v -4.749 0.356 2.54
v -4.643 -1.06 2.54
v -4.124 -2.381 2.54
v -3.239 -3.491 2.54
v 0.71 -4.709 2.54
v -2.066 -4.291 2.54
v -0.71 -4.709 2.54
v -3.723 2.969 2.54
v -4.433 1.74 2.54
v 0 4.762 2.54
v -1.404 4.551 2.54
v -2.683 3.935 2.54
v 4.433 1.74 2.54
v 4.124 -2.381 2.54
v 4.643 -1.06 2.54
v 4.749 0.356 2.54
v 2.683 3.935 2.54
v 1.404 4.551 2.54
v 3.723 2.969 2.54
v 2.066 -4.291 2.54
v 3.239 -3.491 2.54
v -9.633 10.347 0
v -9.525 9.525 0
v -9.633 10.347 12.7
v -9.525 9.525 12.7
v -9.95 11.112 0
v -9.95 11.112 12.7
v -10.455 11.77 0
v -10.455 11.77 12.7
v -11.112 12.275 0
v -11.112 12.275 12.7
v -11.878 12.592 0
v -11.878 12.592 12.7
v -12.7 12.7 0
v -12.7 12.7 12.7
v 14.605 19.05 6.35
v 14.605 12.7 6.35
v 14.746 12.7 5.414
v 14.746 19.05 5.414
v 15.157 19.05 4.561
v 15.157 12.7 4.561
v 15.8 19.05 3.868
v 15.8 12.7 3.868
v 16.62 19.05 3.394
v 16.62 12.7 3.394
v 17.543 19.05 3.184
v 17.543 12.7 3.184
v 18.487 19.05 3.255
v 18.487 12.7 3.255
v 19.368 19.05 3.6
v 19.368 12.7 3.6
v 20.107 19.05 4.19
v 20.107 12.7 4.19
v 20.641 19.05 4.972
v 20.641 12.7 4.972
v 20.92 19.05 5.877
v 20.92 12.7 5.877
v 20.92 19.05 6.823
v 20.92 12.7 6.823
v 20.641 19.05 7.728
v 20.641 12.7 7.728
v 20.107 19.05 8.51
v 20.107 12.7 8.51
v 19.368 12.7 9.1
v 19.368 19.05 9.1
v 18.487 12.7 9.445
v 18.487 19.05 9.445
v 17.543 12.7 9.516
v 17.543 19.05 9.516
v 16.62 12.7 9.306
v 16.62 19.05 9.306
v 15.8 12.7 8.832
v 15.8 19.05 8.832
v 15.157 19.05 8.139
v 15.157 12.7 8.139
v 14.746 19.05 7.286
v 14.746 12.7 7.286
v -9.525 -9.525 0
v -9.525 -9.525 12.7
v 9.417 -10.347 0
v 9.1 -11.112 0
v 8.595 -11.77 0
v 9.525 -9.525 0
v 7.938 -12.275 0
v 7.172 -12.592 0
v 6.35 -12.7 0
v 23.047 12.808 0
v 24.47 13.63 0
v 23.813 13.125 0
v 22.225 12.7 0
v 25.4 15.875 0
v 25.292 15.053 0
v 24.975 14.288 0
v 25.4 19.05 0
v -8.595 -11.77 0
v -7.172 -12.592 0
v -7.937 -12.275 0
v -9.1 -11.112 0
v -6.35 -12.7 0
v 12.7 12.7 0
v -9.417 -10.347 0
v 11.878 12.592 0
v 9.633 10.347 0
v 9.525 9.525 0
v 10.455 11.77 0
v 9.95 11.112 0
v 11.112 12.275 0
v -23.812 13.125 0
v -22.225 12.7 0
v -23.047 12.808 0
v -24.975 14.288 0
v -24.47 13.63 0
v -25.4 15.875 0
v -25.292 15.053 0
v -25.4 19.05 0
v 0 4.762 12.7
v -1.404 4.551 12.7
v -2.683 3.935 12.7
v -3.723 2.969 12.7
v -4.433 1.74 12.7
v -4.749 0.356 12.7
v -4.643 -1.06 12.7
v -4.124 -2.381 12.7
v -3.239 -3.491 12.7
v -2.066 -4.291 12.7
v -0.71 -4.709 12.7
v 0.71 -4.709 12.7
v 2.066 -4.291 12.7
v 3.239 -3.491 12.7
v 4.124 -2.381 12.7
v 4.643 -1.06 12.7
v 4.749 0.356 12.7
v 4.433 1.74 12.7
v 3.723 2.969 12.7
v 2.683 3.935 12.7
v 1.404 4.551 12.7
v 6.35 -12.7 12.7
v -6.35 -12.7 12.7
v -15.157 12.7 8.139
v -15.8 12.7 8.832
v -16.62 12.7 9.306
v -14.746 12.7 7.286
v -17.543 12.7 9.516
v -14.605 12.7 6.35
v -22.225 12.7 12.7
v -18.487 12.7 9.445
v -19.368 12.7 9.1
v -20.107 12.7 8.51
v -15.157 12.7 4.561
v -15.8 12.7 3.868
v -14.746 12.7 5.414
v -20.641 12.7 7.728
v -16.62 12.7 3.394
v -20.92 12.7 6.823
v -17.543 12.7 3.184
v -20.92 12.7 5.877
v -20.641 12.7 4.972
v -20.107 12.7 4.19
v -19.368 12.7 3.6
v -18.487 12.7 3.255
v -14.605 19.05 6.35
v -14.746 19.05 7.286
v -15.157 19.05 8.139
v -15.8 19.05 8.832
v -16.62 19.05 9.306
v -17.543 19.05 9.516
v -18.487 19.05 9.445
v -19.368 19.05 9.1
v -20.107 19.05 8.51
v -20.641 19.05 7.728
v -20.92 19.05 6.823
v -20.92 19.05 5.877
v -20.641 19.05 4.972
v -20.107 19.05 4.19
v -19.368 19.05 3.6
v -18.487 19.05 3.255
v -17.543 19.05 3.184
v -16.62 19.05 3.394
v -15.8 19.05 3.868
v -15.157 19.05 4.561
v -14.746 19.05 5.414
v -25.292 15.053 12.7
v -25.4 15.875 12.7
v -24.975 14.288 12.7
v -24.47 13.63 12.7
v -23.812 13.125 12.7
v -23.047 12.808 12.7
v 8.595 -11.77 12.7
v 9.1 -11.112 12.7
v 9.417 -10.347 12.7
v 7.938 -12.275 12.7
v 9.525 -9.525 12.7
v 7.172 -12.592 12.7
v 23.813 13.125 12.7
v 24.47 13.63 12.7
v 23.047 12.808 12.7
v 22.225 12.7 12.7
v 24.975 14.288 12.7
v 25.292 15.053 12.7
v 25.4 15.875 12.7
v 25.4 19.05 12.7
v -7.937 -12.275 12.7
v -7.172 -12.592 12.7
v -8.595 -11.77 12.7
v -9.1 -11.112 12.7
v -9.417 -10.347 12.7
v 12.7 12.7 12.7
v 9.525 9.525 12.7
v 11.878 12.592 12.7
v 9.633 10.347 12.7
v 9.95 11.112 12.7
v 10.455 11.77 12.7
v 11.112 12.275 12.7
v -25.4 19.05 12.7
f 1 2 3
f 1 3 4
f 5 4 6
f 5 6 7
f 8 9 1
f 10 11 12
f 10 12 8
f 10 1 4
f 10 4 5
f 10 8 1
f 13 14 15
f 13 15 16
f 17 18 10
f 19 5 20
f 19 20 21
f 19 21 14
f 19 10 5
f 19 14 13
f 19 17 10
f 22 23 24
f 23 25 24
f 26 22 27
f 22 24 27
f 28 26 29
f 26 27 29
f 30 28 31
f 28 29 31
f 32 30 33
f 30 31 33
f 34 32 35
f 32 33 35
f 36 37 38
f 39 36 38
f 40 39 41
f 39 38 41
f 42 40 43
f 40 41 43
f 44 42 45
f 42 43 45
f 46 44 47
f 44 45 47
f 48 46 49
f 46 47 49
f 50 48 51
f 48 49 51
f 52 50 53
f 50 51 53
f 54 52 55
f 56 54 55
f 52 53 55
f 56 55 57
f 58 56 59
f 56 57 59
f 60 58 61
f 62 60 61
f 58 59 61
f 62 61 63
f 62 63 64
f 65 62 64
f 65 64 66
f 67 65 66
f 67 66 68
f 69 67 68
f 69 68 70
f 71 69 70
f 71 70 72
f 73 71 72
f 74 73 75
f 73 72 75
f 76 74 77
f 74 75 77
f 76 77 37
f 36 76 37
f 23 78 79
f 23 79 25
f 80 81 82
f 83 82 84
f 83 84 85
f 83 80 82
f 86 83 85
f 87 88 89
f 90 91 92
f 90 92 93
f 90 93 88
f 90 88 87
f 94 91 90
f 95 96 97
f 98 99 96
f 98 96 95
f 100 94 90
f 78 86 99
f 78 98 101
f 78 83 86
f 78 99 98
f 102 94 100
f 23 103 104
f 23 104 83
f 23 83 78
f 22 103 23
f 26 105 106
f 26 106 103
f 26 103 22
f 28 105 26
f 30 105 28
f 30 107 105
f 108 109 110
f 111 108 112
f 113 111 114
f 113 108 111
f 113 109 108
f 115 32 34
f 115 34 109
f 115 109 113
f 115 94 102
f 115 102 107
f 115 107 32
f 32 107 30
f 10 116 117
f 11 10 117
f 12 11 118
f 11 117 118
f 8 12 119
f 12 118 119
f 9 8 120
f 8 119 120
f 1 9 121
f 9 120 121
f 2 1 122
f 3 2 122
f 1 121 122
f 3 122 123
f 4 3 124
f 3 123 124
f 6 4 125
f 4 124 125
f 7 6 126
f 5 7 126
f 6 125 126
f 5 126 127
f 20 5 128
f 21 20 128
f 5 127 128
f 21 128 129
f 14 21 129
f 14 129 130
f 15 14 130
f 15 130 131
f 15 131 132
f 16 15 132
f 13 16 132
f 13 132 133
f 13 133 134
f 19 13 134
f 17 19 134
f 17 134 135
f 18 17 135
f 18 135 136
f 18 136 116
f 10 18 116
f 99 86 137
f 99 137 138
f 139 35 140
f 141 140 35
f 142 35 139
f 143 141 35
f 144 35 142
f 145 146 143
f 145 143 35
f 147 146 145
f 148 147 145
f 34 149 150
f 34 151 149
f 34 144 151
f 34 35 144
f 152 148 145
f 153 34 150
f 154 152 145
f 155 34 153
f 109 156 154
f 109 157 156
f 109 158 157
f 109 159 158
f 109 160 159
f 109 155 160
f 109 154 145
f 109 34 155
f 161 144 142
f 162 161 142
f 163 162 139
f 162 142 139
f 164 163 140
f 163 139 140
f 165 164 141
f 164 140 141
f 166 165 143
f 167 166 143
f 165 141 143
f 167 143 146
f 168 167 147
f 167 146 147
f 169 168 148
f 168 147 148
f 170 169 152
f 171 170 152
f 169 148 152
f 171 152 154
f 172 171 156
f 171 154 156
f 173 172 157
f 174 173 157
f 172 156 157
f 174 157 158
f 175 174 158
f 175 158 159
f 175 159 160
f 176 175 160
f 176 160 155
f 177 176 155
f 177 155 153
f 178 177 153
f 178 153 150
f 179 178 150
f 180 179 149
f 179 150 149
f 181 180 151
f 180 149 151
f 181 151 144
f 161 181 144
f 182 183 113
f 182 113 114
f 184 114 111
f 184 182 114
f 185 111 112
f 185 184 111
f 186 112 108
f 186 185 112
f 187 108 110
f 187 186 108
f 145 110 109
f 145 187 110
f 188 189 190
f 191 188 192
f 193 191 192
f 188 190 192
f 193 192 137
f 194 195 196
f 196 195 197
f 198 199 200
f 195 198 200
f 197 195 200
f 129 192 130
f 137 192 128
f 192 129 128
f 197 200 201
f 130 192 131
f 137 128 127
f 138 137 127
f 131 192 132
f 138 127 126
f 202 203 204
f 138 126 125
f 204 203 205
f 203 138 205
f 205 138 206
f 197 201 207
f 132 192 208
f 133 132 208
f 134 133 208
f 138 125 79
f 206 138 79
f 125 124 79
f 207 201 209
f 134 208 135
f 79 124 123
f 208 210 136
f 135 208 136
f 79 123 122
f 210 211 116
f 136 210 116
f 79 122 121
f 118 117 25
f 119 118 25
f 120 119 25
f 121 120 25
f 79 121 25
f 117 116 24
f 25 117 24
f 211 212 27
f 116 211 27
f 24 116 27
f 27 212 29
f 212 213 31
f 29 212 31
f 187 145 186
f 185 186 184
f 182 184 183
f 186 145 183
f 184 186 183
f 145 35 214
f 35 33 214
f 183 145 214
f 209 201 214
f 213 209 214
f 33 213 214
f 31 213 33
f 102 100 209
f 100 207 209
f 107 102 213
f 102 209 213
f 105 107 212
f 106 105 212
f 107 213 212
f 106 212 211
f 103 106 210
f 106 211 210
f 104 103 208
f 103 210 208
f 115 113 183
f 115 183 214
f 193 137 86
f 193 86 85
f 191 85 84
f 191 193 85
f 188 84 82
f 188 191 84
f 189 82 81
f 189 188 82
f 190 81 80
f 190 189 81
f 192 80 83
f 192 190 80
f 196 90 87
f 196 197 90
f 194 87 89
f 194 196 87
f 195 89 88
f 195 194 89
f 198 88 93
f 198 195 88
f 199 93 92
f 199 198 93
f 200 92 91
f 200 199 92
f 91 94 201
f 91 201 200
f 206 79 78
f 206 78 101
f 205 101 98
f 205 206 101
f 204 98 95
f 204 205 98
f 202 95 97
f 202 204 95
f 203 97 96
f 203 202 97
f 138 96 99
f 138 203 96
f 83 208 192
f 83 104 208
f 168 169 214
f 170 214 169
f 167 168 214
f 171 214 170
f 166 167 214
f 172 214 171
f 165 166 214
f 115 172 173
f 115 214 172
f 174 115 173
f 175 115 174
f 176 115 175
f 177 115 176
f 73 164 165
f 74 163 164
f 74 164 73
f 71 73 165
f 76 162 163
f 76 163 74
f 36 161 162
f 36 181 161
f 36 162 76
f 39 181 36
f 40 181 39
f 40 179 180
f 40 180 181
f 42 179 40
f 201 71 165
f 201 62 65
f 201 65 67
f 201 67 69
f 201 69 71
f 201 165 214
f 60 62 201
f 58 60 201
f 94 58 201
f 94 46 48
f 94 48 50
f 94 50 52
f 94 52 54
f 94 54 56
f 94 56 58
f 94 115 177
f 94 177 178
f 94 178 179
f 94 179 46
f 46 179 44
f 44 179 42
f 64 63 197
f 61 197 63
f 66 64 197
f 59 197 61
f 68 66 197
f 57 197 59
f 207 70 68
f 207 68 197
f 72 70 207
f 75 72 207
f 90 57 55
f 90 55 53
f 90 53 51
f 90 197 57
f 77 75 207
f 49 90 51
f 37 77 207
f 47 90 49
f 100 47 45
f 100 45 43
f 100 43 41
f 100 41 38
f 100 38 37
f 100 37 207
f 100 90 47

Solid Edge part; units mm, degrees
sketch "Sketch1" plane through (0, 0, 0) normal (0, 0, 1) x (1, 0, 0)
  line L0 (-25.4, 19.05) -> (25.4, 19.05)
  line L1 (25.4, 19.05) -> (25.4, 12.7)
  line L2 (25.4, 12.7) -> (9.525, 12.7)
  line L3 (9.525, 12.7) -> (9.525, -12.7)
  line L4 (9.525, -12.7) -> (-9.525, -12.7)
  line L5 (-9.525, -12.7) -> (-9.525, 12.7)
  line L6 (-9.525, 12.7) -> (-25.4, 12.7)
  line L7 (-25.4, 12.7) -> (-25.4, 19.05)
  dimension "D1" = 6.35
  dimension "D2" = 19.05
  dimension "D3" = 6.35
  dimension "D4" = 50.8
  dimension "D5" = 25.4
  dimension "D6" = 15.875
  dimension "D7" = 15.875
  dimension "D8" = 25.4
extrude "Protrusion1" add sketch "Sketch1" along normal blind 12.7
fillet "Round_1" radius 3.175 6 edges at (9.525, 12.7, 6.35) (9.525, -12.7, 6.35) (-9.525, -12.7, 6.35) (25.4, 12.7, 6.35) (-9.525, 12.7, 6.35) (-25.4, 12.7, 6.35)
sketch "Sketch2" plane through (0, 3.175, 12.7) normal (0, 0, 1) x (0, 1, 0)
  circle A0 centre (-3.175, 0) radius 4.7625
extrude "PivotHole" cut sketch "Sketch2" against normal blind 10.16
sketch "Sketch3" plane through (-17.4625, 12.7, 6.35) normal (0, -1, 0) x (1, 0, 0)
  circle A0 centre (-0.3175, 0) radius 3.175
  dimension "D1" = 4.445
  dimension "D2" = 6.35
  dimension "D3" = 7.62
extrude "v_1" cut sketch "Sketch3" against normal blind 25.4
mirror "Mirror1" about plane through (0, 0, 0) normal (1, 0, 0) of "v_1"
properties material "Aluminum, 6061-T6"
